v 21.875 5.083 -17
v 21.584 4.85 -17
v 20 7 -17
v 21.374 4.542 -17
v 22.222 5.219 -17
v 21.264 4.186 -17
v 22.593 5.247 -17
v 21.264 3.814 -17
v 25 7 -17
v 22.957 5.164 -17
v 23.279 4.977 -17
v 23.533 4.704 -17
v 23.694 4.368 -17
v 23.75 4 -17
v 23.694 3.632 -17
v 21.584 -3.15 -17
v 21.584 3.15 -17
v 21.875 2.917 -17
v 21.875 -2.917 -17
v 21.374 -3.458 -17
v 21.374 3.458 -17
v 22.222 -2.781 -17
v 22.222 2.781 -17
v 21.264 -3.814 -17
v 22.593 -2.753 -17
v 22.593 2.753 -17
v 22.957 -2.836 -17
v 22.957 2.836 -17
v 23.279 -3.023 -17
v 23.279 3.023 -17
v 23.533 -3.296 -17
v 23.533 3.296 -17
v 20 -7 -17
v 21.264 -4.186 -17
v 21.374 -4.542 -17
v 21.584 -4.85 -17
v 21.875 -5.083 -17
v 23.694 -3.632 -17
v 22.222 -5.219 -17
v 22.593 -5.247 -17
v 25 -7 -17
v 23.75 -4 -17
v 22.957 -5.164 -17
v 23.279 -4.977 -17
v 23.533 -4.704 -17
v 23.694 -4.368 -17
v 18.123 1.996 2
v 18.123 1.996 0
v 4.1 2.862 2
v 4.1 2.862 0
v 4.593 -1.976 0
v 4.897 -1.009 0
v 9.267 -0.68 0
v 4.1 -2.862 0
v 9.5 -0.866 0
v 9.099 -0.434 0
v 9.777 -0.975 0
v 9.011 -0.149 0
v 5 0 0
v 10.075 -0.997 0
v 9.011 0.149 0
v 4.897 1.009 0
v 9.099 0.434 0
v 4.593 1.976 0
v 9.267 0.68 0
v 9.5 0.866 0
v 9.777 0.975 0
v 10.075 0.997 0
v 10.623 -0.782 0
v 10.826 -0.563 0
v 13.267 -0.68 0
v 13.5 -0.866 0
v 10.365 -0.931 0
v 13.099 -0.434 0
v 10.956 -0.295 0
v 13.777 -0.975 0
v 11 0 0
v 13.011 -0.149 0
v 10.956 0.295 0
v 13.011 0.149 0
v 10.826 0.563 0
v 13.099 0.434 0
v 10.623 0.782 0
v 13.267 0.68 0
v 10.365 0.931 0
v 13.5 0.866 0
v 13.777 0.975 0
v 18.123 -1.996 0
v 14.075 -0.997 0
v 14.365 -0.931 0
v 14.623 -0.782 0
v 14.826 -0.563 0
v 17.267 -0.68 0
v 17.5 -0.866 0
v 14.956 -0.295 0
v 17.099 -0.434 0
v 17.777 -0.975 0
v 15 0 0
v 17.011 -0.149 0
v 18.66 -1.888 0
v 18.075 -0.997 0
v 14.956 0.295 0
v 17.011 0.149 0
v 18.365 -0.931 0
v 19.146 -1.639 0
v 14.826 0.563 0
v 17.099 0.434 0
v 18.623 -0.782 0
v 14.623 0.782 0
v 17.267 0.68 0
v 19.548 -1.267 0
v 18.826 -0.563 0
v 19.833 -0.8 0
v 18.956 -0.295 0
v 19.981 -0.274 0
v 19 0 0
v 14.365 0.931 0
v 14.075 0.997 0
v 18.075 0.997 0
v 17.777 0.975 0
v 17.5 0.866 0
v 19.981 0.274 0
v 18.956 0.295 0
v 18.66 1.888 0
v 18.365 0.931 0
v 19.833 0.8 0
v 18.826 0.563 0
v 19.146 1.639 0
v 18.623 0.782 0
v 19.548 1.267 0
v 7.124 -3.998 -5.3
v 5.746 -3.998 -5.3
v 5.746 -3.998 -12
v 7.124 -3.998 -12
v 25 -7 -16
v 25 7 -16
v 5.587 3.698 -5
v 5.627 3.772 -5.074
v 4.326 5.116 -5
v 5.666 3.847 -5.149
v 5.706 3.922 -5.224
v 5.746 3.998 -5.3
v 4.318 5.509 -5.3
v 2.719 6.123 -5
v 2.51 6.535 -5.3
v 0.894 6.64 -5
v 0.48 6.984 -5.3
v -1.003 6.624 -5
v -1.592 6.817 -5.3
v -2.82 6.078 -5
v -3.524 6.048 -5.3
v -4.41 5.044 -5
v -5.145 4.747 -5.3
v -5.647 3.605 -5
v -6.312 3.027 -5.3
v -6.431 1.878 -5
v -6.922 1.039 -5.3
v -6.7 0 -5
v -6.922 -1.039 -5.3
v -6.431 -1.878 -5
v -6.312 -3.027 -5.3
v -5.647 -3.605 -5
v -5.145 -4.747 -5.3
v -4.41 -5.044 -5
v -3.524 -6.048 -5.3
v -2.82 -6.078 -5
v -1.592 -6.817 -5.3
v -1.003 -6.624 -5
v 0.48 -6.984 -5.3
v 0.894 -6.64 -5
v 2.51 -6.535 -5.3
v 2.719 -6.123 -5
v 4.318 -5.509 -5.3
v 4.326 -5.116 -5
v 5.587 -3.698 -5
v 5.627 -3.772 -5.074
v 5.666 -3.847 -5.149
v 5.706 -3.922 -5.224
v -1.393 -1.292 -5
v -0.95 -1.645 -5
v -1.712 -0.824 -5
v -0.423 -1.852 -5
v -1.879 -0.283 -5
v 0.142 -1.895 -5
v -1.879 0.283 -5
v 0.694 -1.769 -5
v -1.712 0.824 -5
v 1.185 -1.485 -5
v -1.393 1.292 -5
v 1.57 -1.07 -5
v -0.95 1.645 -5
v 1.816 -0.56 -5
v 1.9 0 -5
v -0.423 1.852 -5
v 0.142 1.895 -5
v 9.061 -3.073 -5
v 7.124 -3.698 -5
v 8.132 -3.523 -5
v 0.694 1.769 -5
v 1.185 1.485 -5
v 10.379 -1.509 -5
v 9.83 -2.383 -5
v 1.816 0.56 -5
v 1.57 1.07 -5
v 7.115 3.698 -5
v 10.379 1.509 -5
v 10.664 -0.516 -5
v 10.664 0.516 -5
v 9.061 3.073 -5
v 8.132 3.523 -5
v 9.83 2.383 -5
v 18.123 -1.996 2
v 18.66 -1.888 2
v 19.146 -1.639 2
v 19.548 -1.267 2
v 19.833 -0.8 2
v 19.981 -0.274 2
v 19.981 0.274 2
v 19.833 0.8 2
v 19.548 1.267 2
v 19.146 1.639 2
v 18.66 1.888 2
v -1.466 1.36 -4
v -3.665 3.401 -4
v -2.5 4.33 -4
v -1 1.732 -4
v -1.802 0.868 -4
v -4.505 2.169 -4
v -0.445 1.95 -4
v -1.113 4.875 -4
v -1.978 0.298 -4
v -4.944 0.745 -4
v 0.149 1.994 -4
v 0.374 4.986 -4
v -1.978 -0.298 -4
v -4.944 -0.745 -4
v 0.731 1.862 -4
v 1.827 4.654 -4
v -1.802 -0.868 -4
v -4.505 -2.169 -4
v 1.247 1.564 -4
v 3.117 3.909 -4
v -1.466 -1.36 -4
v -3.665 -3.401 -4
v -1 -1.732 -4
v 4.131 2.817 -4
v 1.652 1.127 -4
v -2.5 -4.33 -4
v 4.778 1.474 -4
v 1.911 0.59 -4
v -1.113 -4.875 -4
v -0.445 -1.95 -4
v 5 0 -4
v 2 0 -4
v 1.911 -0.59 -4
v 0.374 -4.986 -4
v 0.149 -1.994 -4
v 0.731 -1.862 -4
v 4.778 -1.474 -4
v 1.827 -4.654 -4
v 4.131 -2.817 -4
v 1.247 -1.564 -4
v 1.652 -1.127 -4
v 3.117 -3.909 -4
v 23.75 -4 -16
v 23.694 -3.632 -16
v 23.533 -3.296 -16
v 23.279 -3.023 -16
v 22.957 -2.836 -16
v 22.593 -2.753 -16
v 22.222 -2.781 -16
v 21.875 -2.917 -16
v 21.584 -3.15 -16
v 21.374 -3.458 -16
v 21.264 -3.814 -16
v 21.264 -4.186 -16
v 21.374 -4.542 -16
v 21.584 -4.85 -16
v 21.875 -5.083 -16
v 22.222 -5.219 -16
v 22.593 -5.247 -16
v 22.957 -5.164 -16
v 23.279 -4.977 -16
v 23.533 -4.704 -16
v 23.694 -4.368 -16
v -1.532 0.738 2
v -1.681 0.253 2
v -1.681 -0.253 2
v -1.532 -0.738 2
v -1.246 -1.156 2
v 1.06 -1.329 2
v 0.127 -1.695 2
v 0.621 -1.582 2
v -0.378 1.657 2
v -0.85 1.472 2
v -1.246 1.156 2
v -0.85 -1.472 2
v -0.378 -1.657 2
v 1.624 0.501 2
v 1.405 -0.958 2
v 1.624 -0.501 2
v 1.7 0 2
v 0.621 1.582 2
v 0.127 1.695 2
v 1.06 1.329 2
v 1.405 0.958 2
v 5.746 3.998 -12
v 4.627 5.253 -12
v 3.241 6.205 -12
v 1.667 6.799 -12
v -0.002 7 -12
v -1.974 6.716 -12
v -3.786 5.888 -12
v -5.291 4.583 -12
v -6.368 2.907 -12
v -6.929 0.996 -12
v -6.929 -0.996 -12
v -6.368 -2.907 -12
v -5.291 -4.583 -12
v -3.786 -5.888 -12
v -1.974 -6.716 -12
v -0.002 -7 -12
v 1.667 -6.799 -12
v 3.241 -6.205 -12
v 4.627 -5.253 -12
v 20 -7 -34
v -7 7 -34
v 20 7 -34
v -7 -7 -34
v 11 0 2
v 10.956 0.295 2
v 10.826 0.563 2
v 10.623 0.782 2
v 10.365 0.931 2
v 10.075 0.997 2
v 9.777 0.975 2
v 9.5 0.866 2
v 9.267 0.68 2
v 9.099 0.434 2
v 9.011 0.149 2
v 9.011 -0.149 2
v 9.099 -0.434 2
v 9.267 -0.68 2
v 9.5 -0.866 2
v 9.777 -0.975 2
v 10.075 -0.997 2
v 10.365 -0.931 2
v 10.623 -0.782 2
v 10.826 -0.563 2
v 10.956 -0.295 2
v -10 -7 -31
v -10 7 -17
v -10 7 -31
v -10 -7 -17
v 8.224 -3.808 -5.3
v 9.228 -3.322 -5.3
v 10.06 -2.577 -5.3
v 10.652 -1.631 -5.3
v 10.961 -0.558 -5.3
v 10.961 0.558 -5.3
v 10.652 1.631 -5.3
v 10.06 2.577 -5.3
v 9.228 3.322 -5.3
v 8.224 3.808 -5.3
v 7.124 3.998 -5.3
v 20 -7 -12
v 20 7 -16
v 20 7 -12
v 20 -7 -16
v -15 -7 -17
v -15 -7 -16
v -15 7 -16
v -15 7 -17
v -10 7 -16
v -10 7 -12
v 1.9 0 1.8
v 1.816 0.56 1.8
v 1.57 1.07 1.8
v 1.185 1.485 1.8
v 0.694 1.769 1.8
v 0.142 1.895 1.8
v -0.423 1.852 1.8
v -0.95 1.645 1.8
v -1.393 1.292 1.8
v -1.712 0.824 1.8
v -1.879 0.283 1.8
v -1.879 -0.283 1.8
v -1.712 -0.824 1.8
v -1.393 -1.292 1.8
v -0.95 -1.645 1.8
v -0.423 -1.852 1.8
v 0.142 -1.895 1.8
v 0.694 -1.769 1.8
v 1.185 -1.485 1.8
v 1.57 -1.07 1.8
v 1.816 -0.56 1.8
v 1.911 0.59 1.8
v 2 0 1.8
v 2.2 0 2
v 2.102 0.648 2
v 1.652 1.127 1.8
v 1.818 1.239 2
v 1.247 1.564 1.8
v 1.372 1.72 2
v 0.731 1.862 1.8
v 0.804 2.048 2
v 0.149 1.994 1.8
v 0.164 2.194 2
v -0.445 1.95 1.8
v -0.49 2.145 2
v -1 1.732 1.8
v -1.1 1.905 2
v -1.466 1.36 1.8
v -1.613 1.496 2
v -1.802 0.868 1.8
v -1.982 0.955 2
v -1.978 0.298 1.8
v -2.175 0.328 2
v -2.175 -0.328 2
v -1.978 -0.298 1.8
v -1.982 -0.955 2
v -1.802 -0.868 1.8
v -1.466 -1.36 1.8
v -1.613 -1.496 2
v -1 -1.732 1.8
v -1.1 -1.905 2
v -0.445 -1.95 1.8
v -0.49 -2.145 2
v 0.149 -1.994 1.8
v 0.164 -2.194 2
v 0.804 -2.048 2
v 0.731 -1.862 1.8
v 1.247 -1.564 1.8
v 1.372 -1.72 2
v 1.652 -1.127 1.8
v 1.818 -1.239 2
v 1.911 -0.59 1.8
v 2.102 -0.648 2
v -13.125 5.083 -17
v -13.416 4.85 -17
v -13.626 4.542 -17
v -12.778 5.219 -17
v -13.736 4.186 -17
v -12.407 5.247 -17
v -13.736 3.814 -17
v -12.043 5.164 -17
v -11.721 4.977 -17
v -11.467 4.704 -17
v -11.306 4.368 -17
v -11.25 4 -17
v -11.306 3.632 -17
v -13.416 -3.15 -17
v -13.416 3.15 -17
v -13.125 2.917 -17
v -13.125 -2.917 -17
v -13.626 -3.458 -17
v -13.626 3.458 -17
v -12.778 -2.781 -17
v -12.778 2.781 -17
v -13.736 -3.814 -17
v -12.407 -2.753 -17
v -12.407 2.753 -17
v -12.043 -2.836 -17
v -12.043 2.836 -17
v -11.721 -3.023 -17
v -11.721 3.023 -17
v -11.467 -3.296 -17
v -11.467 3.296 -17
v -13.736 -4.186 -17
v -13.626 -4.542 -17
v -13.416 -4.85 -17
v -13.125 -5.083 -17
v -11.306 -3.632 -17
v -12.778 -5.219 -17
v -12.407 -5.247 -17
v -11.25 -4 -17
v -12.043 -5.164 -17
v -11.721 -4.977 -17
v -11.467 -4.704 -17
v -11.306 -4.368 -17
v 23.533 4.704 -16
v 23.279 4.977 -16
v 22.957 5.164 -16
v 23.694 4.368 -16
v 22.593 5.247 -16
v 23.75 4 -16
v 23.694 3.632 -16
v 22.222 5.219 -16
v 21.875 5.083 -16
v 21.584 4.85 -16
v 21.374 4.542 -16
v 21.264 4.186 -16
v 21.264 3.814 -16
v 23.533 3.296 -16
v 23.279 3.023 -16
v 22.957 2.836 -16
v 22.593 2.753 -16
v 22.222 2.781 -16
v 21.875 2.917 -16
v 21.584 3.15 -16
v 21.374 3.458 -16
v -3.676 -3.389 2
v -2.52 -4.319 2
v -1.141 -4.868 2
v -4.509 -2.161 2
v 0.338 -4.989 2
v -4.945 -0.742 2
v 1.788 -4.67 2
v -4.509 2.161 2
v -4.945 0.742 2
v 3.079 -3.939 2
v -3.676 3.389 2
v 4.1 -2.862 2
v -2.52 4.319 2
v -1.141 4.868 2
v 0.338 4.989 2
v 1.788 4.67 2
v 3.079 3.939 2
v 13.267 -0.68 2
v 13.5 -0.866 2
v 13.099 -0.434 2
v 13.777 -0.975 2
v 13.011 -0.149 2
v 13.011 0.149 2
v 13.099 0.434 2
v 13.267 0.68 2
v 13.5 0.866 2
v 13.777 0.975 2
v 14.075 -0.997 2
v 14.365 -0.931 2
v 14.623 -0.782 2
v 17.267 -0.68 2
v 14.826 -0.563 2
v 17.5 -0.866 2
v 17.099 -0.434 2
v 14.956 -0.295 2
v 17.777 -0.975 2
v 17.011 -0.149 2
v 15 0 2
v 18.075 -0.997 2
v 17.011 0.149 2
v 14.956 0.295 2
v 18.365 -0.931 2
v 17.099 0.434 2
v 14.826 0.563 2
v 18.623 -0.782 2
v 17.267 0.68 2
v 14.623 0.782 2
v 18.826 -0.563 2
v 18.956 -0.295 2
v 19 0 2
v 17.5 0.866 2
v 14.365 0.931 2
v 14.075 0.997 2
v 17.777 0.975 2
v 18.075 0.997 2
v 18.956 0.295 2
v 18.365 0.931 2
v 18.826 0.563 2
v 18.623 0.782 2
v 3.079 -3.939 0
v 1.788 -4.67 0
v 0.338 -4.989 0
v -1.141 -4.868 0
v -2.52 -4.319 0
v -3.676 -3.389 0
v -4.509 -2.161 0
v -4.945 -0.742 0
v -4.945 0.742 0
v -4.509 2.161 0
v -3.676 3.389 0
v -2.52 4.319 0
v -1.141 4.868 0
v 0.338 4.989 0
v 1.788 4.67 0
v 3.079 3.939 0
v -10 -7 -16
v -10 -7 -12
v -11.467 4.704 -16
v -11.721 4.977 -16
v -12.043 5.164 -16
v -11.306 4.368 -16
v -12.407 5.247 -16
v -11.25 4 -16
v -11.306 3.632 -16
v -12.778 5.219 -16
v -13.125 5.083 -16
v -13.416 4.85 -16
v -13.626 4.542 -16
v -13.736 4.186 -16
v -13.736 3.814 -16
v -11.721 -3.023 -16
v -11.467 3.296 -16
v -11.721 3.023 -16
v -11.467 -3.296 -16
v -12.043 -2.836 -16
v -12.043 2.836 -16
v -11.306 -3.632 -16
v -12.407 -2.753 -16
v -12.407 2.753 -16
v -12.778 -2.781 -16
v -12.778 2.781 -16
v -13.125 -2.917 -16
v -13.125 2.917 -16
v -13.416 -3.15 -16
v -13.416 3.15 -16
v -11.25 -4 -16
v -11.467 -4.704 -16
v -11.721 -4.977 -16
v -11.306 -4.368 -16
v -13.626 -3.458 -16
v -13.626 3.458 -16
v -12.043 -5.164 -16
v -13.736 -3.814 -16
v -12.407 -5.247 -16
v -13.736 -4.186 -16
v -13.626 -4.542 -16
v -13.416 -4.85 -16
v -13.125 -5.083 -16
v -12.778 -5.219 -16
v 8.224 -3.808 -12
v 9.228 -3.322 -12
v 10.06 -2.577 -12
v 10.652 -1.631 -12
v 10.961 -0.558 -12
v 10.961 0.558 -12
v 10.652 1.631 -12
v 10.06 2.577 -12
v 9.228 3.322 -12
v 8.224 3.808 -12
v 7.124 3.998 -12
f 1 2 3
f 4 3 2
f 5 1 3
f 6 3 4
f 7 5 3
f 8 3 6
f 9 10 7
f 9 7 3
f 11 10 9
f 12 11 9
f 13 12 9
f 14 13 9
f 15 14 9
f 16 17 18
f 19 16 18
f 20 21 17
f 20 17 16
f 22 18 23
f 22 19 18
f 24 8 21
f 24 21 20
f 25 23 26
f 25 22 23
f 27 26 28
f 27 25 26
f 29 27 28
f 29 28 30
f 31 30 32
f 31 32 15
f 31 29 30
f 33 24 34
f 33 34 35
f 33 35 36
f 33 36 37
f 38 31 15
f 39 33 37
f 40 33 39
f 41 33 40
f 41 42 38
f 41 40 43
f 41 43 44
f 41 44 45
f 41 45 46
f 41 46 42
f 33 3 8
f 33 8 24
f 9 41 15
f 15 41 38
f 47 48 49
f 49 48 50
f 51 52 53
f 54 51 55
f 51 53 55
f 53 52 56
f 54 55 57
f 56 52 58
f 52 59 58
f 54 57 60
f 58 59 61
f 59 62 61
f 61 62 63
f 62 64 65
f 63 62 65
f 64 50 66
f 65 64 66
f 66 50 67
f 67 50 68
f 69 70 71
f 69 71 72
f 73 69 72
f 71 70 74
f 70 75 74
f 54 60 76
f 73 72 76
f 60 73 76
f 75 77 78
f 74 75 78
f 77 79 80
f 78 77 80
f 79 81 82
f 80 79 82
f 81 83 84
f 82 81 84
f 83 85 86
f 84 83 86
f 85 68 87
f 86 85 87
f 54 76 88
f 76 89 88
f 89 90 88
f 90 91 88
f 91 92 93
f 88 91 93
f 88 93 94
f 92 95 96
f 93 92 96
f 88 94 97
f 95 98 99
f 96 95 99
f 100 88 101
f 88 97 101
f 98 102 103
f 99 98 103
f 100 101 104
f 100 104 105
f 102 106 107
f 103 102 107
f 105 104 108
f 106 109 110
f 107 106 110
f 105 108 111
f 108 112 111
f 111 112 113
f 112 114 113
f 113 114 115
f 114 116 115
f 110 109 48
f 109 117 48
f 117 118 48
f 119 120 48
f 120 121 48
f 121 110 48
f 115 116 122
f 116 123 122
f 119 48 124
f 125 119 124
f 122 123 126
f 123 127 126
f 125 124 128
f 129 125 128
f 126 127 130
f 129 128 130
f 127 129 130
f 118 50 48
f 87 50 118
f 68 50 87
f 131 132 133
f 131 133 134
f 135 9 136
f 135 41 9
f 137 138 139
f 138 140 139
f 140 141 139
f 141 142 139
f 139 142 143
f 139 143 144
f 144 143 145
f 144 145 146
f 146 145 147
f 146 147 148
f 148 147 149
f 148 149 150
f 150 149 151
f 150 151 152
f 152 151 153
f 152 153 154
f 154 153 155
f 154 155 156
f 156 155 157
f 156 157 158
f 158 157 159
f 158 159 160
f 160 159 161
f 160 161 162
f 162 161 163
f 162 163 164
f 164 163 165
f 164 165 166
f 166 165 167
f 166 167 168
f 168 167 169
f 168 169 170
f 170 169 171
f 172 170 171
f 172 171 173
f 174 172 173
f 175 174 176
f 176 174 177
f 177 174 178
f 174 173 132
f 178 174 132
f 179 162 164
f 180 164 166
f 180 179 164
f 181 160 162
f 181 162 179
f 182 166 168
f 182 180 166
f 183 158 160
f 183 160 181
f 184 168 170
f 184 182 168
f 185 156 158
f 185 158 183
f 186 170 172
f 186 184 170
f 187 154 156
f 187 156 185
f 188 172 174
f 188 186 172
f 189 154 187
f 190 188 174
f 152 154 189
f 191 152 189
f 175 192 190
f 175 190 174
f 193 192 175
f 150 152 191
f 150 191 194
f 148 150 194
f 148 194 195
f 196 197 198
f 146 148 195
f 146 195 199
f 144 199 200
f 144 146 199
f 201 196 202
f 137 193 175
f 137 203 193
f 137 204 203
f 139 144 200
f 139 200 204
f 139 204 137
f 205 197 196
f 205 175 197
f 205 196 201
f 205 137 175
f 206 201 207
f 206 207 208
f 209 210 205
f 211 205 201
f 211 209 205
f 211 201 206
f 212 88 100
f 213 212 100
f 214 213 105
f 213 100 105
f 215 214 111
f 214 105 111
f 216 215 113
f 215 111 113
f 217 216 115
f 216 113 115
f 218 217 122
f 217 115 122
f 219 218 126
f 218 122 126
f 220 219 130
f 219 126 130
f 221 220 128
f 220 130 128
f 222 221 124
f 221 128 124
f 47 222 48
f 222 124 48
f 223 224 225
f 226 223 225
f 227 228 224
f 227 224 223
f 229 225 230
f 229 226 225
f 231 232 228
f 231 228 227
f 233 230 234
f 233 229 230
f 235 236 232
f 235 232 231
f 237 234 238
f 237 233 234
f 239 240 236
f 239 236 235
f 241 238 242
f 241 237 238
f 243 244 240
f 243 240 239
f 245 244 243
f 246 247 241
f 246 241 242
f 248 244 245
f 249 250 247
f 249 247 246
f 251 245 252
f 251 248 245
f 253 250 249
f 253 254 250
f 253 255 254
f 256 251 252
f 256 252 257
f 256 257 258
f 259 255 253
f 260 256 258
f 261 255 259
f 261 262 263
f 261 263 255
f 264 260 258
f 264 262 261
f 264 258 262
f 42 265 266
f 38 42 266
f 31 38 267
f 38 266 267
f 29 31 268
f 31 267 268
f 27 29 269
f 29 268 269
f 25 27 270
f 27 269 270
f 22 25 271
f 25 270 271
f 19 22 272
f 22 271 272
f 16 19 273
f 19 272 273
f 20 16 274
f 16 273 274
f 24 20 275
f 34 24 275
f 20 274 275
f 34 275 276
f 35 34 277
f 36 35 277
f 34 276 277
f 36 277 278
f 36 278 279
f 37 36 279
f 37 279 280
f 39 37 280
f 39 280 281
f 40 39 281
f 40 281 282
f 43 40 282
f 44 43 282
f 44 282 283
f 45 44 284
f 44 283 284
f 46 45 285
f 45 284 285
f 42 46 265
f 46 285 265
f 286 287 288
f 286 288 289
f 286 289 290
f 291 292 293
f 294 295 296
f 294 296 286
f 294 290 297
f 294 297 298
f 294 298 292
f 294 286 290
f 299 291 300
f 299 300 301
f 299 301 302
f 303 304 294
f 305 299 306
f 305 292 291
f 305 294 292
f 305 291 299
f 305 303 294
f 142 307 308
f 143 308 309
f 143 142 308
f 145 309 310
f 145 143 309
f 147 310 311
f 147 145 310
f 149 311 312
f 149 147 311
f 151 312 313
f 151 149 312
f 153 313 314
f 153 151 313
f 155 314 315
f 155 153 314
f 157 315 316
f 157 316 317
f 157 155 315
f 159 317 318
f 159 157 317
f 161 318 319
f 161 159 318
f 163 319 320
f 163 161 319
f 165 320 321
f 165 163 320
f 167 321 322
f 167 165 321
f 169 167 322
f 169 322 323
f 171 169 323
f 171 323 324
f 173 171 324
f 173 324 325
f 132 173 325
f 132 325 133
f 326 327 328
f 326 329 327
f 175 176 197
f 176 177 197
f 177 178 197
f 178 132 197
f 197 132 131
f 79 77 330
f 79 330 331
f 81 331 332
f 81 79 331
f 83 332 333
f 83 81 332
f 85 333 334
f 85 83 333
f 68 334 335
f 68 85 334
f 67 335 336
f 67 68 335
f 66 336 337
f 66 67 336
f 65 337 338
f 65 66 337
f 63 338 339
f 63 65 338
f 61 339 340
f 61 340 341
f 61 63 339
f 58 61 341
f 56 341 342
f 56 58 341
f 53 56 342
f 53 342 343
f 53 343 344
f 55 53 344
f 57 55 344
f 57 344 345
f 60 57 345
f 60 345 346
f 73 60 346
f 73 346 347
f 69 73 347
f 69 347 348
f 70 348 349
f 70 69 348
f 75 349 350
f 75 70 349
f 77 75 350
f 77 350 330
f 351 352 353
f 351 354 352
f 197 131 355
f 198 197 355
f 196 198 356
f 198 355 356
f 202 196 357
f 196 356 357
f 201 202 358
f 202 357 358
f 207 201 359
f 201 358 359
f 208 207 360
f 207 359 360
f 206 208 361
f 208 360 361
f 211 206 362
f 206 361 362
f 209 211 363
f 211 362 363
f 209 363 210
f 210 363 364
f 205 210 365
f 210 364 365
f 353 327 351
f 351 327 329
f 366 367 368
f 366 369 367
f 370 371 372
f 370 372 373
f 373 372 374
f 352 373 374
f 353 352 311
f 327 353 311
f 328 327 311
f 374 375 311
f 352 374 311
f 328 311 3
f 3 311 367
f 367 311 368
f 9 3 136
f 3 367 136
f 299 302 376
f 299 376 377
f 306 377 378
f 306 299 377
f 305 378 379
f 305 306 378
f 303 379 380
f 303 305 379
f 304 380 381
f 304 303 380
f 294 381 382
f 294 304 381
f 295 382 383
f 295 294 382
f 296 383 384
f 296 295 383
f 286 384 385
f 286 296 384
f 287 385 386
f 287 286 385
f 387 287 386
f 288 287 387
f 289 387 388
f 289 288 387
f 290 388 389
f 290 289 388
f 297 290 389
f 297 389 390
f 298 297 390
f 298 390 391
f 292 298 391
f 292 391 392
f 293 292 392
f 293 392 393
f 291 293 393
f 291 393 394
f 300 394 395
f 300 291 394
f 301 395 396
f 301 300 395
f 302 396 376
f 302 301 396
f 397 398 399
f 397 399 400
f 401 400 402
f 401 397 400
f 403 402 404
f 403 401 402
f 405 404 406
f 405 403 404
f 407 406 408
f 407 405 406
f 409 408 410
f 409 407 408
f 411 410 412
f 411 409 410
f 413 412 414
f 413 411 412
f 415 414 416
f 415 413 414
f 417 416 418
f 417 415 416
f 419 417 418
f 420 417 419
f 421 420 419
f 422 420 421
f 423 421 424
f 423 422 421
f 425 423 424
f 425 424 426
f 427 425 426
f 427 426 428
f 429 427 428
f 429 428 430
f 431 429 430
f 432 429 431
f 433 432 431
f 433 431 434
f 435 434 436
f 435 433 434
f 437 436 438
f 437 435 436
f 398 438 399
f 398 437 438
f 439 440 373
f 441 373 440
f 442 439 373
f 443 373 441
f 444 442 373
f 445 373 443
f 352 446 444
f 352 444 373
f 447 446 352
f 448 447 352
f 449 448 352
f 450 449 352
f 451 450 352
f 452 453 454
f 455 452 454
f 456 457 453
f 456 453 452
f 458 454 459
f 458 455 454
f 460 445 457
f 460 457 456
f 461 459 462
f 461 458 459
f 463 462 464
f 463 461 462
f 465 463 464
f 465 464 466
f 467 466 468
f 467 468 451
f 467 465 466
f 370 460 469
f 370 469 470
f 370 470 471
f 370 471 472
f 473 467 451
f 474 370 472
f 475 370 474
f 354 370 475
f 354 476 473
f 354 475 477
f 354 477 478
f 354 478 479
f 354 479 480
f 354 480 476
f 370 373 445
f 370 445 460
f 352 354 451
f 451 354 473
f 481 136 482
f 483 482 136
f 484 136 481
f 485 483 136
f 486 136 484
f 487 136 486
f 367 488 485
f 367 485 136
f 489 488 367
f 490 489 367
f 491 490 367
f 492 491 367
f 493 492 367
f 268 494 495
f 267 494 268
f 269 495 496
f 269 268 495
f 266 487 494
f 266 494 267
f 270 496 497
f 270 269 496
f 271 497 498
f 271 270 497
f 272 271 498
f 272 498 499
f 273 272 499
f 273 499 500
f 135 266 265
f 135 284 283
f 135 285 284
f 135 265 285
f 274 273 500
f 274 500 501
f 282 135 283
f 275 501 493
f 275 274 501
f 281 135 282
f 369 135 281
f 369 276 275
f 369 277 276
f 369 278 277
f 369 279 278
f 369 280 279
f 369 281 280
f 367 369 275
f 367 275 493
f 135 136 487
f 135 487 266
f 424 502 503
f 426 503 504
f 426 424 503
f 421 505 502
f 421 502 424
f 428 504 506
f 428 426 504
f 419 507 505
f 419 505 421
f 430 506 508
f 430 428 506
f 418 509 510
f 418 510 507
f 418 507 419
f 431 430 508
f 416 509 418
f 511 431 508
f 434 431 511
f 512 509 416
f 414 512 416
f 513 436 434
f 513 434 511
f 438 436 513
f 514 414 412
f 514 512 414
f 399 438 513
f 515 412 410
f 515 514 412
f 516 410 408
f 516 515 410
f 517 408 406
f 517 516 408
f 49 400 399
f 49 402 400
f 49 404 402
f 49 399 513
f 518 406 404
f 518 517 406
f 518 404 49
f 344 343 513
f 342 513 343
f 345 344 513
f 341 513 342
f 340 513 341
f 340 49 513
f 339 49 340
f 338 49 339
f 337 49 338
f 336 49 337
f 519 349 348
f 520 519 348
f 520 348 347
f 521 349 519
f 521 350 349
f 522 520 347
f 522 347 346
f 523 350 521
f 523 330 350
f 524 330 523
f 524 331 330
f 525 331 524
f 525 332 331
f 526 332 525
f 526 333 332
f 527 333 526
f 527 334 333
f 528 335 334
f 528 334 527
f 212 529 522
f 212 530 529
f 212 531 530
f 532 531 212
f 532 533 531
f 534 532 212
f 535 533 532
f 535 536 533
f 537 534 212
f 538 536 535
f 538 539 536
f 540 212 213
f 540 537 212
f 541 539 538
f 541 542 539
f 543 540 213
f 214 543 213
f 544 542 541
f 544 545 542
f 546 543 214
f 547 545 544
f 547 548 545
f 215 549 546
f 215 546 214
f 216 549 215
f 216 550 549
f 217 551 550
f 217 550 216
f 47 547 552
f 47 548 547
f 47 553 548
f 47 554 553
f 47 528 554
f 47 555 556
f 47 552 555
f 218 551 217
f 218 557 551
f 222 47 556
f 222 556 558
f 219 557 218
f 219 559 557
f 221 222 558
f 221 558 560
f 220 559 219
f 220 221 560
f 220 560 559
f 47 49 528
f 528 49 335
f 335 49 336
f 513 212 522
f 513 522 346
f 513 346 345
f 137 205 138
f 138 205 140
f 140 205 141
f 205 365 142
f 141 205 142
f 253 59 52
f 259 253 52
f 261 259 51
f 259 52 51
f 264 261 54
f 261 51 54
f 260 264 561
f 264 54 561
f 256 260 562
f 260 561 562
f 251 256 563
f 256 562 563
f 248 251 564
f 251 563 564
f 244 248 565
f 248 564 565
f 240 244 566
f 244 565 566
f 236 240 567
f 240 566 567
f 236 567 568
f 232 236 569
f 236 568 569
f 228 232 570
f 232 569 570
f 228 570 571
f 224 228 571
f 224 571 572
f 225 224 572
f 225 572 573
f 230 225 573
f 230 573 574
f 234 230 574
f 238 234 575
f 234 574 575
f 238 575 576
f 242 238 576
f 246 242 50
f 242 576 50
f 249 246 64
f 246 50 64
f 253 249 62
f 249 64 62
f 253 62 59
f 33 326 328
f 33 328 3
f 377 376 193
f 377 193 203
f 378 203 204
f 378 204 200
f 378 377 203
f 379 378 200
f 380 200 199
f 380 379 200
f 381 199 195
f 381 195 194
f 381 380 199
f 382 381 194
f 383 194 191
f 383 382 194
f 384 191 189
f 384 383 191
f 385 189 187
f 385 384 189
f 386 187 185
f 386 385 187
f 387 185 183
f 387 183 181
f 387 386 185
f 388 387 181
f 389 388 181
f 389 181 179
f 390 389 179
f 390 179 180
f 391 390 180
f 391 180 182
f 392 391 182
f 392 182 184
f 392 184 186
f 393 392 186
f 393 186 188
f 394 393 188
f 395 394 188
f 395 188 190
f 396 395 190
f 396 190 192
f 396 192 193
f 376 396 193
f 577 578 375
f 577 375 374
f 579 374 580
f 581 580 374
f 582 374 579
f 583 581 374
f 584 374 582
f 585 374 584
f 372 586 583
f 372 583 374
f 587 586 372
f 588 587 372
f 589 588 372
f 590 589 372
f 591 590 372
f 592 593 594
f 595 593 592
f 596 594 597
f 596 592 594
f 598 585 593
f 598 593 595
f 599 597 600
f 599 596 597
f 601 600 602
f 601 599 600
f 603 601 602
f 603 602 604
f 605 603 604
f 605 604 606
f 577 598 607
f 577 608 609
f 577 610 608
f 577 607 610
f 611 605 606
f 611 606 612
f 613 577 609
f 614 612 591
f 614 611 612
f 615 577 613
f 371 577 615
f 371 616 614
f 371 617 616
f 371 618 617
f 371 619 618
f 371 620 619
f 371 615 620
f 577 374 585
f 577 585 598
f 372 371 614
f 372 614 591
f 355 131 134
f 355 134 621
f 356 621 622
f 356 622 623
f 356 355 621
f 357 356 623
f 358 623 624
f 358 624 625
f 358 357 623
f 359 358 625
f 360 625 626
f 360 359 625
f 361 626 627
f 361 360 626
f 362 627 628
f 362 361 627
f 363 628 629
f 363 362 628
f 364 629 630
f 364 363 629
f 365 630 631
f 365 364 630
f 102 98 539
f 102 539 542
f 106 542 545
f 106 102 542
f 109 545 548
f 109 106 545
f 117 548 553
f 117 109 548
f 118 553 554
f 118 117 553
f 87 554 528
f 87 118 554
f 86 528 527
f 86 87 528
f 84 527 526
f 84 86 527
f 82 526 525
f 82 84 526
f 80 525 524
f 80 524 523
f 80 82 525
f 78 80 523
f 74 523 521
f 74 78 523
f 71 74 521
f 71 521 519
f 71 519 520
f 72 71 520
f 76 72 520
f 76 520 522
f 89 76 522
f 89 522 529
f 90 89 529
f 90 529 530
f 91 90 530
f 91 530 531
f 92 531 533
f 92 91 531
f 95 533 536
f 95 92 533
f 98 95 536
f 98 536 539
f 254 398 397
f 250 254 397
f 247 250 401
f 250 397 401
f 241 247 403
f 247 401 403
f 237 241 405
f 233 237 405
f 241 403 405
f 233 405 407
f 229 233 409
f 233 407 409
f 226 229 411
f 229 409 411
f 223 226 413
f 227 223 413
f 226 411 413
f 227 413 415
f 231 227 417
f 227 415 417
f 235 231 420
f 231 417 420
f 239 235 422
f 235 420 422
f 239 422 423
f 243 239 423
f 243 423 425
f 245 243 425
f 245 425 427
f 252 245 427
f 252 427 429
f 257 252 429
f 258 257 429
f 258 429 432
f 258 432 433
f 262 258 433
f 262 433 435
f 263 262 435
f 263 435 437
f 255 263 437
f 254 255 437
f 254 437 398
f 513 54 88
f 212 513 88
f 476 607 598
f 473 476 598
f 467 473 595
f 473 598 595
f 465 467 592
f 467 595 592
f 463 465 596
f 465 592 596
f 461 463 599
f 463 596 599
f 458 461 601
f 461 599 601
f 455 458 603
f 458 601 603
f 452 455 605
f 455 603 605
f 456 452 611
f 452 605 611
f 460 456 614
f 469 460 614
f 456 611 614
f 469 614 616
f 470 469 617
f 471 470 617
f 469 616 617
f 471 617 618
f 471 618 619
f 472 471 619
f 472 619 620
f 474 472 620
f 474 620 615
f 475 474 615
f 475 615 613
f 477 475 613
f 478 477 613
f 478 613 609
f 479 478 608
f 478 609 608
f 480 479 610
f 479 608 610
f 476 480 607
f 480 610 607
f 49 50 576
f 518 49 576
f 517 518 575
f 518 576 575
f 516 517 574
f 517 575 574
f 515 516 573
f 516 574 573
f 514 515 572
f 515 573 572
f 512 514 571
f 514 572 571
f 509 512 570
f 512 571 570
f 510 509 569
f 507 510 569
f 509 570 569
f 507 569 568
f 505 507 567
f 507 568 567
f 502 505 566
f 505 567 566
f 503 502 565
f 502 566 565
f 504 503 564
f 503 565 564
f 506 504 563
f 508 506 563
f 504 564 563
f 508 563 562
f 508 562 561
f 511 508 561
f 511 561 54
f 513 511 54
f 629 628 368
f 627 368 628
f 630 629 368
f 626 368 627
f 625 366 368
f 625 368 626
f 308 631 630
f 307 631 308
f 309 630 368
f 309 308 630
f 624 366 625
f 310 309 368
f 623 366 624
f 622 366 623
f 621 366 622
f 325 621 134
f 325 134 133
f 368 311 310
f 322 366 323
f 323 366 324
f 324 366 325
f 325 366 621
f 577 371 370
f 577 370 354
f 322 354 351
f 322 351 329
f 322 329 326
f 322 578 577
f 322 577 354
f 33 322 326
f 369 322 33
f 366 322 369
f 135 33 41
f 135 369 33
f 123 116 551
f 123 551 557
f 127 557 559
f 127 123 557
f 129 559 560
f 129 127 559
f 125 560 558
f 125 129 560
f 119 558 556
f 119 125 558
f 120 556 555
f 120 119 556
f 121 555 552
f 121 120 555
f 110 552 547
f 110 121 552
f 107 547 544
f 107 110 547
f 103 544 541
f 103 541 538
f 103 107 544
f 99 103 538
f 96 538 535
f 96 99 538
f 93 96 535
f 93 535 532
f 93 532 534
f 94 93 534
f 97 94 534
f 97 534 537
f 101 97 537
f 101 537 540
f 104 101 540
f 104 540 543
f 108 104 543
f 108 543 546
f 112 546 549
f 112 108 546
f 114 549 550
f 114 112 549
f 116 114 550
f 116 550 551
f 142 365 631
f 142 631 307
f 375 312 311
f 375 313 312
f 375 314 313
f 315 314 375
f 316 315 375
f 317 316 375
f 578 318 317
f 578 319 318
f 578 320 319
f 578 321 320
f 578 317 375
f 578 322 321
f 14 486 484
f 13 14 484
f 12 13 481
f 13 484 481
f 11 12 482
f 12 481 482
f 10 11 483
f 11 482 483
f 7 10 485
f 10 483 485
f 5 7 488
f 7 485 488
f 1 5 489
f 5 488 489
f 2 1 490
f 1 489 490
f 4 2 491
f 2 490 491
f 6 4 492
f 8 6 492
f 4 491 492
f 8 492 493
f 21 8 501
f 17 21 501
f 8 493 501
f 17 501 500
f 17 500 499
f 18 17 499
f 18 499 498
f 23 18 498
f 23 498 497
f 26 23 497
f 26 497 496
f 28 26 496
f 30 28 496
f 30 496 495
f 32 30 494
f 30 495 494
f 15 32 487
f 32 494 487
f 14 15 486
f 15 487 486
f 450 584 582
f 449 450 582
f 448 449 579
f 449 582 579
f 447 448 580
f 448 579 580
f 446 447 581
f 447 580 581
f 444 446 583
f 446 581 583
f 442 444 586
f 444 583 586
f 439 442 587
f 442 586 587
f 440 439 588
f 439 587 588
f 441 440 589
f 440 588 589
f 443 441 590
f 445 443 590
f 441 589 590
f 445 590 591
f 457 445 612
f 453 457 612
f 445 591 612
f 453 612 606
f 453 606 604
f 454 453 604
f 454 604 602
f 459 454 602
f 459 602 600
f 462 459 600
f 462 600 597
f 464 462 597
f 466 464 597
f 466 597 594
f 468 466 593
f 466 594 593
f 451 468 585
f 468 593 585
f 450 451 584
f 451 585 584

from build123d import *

# Parameters (mm, degrees)
F0_R      = 1
F1_DEPTH  = 2
F2_R      = 5
F3_DEPTH  = 4
F4_R      = 2
F5_DEPTH  = 25
F6_R      = 1.9
F7_DEPTH  = 10
F8_SIZE   = 0.2
F8_2_SIZE = 0.2
F10_DEPTH = 7
F12_DEPTH = 7
F13_SIZE  = 0.3
F14_R     = 1.25
F15_DEPTH = 1
F16_SIZE  = 3


with BuildPart() as f1:
    # F0 (on Top) → F1 (new body)
    with BuildSketch(Plane.XY):
        with BuildLine():
            Line((18.12322, 1.996201), (4.1, 2.861818))
            ThreePointArc((4.1, 2.861818), (-5, 0), (4.1, -2.861818))
            Line((4.1, -2.861818), (18.12322, -1.996201))
            ThreePointArc((18.12322, -1.996201), (20, 0), (18.12322, 1.996201))
        make_face()
        with Locations((10, 0)):
            Circle(F0_R, mode=Mode.SUBTRACT)
        with Locations((14, 0)):
            Circle(F0_R, mode=Mode.SUBTRACT)
        with Locations((18, 0)):
            Circle(F0_R, mode=Mode.SUBTRACT)
    extrude(amount=F1_DEPTH)

    # F2 (on face) → F3 (join)
    with BuildSketch(Plane(origin=(0, 0, 0), x_dir=(1, 0, 0), z_dir=(0, 0, -1))):
        Circle(F2_R)
    extrude(amount=F3_DEPTH)

    # F4 (on face) → F5 (cut)
    with BuildSketch(Plane.XY.offset(2)):
        Circle(F4_R)
    extrude(amount=-F5_DEPTH, mode=Mode.SUBTRACT)

    # F8#2
    f8_2_edges = [f1.edges().sort_by_distance(p)[0] for p in [
        (-2, 0, 2),
    ]]
    chamfer(f8_2_edges, length=F8_2_SIZE)


with BuildPart() as f7:
    # F6 (on face) → F7 (new body)
    with BuildSketch(Plane.XY.offset(2)):
        Circle(F6_R)
    extrude(amount=-F7_DEPTH)

    # F8
    f8_edges = [f7.edges().sort_by_distance(p)[0] for p in [
        (-1.9, 0, 2),
    ]]
    chamfer(f8_edges, length=F8_SIZE)



with BuildPart() as f10:
    # F9 (on Front) → F10 (new body, symmetric)
    with BuildSketch(Plane.XZ):
        Polygon((20, -16), (20, -12), (-10, -12), (-10, -16), (-15, -16), (-15, -17), (-10, -17), (-10, -34), (20, -34), (20, -17), (25, -17), (25, -16), align=None)
    extrude(amount=F10_DEPTH, both=True)


with BuildPart() as f7_1:
    add(f7.part)

    add(f10.part)  # F12 merges F10
    # F11 (on face) → F12 (join, symmetric)
    with BuildSketch(Plane.XY.offset(-12)):
        with BuildLine():
            Line((7.123901, 3.998081), (5.745899, 3.998081))
            ThreePointArc((5.745899, 3.998081), (-7, 0), (5.745899, -3.998081))
            Line((5.745899, -3.998081), (7.123901, -3.998081))
            ThreePointArc((7.123901, -3.998081), (11, 0), (7.123901, 3.998081))
        make_face()
    extrude(amount=F12_DEPTH, both=True)

    # F13
    f13_edges = [f7_1.edges().sort_by_distance(p)[0] for p in [
        (-7, 0, -5),
        (6.4349, -3.998081, -5),
        (11, 0, -5),
        (6.4349, 3.998081, -5),
    ]]
    chamfer(f13_edges, length=F13_SIZE)

    # F14 (on face) → F15 (cut, through all)
    with BuildSketch(Plane.XY.offset(-16)):
        with Locations((22.5, 4)):
            Circle(F14_R)
        with Locations((-12.5, 4)):
            Circle(F14_R)
        with Locations((22.5, -4)):
            Circle(F14_R)
        with Locations((-12.5, -4)):
            Circle(F14_R)
    extrude(amount=-F15_DEPTH, mode=Mode.SUBTRACT)

    # F16
    f16_edges = [f7_1.edges().sort_by_distance(p)[0] for p in [
        (-10, 0, -34),
    ]]
    chamfer(f16_edges, length=F16_SIZE)


solid = Compound([f1.part, f7_1.part])
